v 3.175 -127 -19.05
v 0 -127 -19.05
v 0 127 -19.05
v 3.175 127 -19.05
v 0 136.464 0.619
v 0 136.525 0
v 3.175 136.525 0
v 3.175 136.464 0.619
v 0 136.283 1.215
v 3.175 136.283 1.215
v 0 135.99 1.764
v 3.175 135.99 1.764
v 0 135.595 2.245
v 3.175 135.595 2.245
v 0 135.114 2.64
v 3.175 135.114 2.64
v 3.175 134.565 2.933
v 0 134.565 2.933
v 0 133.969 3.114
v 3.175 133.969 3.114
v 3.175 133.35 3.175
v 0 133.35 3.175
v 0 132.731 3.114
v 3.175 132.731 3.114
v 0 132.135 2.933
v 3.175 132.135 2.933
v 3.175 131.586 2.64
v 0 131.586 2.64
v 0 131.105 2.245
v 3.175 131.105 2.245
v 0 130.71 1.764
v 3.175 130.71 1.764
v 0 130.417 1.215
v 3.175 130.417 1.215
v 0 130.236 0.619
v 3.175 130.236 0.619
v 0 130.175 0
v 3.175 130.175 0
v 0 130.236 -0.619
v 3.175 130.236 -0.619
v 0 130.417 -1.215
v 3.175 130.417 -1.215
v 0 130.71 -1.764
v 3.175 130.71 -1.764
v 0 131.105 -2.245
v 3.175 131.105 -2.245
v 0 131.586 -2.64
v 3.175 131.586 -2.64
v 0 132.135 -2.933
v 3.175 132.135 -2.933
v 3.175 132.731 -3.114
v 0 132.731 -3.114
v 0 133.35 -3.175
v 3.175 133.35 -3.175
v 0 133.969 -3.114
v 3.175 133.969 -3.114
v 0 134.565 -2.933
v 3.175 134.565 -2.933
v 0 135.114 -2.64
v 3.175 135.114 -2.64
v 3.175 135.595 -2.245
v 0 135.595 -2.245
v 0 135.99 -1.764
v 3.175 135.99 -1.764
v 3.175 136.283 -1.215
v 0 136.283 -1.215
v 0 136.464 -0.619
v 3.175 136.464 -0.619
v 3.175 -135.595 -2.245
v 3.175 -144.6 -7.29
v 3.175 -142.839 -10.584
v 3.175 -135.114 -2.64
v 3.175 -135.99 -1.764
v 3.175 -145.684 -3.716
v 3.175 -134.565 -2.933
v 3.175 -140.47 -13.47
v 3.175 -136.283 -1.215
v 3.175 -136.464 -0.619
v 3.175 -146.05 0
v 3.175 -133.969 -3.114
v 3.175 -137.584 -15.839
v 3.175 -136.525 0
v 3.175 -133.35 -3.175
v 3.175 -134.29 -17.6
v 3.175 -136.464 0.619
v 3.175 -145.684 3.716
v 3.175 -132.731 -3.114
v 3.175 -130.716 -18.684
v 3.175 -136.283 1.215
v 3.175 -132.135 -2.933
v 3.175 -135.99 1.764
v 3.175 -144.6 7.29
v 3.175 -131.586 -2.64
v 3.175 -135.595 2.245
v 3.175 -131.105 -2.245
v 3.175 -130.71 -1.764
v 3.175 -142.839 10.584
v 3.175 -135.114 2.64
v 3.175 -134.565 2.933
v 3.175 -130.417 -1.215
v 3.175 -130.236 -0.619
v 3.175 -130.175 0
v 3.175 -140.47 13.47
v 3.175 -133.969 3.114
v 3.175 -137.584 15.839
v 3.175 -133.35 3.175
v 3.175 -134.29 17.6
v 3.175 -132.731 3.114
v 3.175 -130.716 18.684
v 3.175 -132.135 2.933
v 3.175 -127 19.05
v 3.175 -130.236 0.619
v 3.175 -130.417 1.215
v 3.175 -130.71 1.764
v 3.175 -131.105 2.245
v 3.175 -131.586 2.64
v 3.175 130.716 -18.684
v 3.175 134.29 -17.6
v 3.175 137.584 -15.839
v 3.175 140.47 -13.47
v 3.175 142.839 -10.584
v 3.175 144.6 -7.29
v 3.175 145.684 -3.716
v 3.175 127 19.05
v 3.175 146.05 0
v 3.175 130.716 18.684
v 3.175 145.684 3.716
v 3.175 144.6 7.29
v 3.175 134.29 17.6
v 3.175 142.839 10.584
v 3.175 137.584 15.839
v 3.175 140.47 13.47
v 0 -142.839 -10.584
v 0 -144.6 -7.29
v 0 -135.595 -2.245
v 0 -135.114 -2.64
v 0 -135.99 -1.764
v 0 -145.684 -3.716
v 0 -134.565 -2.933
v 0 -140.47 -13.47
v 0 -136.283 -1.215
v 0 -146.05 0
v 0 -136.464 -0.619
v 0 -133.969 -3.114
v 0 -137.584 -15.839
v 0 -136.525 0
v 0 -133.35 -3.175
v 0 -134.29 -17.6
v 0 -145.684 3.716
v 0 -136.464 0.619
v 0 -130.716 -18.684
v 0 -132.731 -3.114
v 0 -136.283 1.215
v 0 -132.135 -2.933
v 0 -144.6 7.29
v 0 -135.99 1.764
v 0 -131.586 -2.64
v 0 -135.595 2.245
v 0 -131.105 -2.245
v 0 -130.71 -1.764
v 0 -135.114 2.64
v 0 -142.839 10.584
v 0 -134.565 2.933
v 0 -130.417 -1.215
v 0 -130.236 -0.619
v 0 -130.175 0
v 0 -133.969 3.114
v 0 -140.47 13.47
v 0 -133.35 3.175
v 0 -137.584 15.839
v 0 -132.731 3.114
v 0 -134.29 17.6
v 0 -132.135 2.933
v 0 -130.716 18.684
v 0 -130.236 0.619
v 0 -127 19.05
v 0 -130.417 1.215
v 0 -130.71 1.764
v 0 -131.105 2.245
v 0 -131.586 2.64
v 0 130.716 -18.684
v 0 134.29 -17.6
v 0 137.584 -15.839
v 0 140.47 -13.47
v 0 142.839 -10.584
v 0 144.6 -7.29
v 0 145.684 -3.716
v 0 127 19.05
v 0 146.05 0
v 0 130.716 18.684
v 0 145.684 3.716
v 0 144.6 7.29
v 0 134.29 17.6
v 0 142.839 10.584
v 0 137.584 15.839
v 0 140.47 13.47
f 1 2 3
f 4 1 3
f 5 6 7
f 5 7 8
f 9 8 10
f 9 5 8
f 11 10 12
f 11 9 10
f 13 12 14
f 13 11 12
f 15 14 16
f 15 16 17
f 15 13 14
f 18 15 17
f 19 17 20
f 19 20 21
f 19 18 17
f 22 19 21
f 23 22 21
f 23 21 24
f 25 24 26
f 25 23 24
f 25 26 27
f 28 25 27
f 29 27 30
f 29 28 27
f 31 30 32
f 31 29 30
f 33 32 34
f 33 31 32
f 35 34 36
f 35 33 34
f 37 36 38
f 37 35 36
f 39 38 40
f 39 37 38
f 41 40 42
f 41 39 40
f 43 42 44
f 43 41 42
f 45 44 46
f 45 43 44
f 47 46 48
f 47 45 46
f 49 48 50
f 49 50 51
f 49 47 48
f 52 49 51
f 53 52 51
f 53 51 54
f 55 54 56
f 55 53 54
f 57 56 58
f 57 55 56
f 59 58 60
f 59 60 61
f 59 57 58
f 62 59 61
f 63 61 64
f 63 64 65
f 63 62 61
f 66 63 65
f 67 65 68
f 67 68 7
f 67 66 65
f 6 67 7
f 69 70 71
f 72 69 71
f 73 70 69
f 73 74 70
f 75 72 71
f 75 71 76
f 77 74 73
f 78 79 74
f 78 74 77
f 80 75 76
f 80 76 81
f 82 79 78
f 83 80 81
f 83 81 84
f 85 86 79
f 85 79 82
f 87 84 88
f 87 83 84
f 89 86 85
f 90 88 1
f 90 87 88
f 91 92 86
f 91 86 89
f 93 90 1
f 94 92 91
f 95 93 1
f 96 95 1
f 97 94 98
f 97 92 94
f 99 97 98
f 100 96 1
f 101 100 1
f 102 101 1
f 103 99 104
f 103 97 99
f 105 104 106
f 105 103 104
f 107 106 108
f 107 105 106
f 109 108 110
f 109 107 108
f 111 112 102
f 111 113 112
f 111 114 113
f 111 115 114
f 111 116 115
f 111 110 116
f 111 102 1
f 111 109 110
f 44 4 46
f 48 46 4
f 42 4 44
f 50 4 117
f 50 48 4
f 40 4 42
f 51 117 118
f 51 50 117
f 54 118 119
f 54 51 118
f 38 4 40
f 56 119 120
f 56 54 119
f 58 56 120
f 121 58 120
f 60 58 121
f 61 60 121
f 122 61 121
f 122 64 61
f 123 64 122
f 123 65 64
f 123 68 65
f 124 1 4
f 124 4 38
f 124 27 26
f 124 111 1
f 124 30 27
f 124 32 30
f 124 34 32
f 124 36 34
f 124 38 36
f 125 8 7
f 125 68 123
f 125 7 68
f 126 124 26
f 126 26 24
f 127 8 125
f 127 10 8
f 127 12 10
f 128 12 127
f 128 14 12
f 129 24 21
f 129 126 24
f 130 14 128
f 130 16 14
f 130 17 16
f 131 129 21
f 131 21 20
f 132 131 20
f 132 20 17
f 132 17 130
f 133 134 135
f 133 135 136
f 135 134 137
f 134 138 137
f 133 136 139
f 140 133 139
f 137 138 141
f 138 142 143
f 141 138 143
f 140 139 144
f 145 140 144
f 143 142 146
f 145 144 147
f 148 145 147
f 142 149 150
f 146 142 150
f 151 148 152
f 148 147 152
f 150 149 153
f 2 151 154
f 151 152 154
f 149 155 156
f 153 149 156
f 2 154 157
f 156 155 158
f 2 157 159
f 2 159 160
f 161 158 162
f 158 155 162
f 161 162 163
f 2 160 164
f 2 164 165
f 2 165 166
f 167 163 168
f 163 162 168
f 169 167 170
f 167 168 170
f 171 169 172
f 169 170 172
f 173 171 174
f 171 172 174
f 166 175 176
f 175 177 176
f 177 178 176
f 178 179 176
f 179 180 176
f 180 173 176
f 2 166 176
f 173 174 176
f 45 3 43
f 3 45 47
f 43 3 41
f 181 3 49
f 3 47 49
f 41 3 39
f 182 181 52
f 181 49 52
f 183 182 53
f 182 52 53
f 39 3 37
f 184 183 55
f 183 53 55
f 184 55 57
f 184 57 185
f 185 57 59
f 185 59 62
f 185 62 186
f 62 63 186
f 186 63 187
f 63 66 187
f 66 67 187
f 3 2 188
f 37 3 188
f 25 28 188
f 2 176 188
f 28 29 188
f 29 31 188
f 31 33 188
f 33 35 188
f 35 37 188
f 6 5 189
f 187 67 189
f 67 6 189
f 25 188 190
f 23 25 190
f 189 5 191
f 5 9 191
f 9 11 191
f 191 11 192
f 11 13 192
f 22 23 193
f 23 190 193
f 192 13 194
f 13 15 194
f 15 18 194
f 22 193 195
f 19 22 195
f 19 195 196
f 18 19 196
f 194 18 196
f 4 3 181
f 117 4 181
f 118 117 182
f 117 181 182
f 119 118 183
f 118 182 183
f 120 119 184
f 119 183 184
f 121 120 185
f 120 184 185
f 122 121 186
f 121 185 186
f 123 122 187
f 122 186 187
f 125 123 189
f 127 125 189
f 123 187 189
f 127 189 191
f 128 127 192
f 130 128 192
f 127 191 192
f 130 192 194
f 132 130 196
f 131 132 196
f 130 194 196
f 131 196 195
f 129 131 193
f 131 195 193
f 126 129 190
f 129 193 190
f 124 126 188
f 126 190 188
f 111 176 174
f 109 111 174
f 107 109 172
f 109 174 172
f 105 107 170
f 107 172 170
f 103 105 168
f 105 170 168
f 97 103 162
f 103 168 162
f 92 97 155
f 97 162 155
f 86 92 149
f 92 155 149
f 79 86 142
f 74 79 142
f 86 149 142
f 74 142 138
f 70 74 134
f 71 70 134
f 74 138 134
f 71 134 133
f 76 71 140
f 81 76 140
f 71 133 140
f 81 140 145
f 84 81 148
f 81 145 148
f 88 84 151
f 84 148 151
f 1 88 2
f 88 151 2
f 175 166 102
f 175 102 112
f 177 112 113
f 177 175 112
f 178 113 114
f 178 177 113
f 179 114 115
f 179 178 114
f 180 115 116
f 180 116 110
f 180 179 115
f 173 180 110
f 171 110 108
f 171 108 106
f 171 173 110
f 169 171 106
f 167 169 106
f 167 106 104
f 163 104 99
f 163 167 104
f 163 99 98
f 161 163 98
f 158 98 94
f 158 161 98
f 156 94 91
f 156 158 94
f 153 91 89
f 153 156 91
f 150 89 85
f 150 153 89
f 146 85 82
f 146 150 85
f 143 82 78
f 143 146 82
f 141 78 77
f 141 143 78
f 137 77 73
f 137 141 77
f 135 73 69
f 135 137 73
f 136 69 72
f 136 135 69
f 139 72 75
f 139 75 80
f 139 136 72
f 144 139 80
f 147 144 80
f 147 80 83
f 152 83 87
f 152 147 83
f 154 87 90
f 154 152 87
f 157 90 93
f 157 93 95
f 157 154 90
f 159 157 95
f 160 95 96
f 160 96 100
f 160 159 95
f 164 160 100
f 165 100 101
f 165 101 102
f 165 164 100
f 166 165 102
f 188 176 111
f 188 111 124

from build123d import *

# Parameters (mm, degrees)
F0_W     = 254
F0_H     = 38.1
F0_R     = 3.175
F1_DEPTH = 3.175


with BuildPart() as f1:
    # F0 (on Right) → F1 (new body)
    with BuildSketch(Plane.YZ):
        Rectangle(F0_W, F0_H)
        with BuildLine():
            ThreePointArc((127, -19.05), (146.05, 0), (127, 19.05))
            Line((127, 19.05), (127, -19.05))
        make_face()
        with Locations((133.35, 0)):
            Circle(F0_R, mode=Mode.SUBTRACT)
        with BuildLine():
            Line((-127, -19.05), (-127, 19.05))
            ThreePointArc((-127, 19.05), (-146.05, 0), (-127, -19.05))
        make_face()
        with Locations((-133.35, 0)):
            Circle(F0_R, mode=Mode.SUBTRACT)
    extrude(amount=F1_DEPTH)


solid = f1.part
